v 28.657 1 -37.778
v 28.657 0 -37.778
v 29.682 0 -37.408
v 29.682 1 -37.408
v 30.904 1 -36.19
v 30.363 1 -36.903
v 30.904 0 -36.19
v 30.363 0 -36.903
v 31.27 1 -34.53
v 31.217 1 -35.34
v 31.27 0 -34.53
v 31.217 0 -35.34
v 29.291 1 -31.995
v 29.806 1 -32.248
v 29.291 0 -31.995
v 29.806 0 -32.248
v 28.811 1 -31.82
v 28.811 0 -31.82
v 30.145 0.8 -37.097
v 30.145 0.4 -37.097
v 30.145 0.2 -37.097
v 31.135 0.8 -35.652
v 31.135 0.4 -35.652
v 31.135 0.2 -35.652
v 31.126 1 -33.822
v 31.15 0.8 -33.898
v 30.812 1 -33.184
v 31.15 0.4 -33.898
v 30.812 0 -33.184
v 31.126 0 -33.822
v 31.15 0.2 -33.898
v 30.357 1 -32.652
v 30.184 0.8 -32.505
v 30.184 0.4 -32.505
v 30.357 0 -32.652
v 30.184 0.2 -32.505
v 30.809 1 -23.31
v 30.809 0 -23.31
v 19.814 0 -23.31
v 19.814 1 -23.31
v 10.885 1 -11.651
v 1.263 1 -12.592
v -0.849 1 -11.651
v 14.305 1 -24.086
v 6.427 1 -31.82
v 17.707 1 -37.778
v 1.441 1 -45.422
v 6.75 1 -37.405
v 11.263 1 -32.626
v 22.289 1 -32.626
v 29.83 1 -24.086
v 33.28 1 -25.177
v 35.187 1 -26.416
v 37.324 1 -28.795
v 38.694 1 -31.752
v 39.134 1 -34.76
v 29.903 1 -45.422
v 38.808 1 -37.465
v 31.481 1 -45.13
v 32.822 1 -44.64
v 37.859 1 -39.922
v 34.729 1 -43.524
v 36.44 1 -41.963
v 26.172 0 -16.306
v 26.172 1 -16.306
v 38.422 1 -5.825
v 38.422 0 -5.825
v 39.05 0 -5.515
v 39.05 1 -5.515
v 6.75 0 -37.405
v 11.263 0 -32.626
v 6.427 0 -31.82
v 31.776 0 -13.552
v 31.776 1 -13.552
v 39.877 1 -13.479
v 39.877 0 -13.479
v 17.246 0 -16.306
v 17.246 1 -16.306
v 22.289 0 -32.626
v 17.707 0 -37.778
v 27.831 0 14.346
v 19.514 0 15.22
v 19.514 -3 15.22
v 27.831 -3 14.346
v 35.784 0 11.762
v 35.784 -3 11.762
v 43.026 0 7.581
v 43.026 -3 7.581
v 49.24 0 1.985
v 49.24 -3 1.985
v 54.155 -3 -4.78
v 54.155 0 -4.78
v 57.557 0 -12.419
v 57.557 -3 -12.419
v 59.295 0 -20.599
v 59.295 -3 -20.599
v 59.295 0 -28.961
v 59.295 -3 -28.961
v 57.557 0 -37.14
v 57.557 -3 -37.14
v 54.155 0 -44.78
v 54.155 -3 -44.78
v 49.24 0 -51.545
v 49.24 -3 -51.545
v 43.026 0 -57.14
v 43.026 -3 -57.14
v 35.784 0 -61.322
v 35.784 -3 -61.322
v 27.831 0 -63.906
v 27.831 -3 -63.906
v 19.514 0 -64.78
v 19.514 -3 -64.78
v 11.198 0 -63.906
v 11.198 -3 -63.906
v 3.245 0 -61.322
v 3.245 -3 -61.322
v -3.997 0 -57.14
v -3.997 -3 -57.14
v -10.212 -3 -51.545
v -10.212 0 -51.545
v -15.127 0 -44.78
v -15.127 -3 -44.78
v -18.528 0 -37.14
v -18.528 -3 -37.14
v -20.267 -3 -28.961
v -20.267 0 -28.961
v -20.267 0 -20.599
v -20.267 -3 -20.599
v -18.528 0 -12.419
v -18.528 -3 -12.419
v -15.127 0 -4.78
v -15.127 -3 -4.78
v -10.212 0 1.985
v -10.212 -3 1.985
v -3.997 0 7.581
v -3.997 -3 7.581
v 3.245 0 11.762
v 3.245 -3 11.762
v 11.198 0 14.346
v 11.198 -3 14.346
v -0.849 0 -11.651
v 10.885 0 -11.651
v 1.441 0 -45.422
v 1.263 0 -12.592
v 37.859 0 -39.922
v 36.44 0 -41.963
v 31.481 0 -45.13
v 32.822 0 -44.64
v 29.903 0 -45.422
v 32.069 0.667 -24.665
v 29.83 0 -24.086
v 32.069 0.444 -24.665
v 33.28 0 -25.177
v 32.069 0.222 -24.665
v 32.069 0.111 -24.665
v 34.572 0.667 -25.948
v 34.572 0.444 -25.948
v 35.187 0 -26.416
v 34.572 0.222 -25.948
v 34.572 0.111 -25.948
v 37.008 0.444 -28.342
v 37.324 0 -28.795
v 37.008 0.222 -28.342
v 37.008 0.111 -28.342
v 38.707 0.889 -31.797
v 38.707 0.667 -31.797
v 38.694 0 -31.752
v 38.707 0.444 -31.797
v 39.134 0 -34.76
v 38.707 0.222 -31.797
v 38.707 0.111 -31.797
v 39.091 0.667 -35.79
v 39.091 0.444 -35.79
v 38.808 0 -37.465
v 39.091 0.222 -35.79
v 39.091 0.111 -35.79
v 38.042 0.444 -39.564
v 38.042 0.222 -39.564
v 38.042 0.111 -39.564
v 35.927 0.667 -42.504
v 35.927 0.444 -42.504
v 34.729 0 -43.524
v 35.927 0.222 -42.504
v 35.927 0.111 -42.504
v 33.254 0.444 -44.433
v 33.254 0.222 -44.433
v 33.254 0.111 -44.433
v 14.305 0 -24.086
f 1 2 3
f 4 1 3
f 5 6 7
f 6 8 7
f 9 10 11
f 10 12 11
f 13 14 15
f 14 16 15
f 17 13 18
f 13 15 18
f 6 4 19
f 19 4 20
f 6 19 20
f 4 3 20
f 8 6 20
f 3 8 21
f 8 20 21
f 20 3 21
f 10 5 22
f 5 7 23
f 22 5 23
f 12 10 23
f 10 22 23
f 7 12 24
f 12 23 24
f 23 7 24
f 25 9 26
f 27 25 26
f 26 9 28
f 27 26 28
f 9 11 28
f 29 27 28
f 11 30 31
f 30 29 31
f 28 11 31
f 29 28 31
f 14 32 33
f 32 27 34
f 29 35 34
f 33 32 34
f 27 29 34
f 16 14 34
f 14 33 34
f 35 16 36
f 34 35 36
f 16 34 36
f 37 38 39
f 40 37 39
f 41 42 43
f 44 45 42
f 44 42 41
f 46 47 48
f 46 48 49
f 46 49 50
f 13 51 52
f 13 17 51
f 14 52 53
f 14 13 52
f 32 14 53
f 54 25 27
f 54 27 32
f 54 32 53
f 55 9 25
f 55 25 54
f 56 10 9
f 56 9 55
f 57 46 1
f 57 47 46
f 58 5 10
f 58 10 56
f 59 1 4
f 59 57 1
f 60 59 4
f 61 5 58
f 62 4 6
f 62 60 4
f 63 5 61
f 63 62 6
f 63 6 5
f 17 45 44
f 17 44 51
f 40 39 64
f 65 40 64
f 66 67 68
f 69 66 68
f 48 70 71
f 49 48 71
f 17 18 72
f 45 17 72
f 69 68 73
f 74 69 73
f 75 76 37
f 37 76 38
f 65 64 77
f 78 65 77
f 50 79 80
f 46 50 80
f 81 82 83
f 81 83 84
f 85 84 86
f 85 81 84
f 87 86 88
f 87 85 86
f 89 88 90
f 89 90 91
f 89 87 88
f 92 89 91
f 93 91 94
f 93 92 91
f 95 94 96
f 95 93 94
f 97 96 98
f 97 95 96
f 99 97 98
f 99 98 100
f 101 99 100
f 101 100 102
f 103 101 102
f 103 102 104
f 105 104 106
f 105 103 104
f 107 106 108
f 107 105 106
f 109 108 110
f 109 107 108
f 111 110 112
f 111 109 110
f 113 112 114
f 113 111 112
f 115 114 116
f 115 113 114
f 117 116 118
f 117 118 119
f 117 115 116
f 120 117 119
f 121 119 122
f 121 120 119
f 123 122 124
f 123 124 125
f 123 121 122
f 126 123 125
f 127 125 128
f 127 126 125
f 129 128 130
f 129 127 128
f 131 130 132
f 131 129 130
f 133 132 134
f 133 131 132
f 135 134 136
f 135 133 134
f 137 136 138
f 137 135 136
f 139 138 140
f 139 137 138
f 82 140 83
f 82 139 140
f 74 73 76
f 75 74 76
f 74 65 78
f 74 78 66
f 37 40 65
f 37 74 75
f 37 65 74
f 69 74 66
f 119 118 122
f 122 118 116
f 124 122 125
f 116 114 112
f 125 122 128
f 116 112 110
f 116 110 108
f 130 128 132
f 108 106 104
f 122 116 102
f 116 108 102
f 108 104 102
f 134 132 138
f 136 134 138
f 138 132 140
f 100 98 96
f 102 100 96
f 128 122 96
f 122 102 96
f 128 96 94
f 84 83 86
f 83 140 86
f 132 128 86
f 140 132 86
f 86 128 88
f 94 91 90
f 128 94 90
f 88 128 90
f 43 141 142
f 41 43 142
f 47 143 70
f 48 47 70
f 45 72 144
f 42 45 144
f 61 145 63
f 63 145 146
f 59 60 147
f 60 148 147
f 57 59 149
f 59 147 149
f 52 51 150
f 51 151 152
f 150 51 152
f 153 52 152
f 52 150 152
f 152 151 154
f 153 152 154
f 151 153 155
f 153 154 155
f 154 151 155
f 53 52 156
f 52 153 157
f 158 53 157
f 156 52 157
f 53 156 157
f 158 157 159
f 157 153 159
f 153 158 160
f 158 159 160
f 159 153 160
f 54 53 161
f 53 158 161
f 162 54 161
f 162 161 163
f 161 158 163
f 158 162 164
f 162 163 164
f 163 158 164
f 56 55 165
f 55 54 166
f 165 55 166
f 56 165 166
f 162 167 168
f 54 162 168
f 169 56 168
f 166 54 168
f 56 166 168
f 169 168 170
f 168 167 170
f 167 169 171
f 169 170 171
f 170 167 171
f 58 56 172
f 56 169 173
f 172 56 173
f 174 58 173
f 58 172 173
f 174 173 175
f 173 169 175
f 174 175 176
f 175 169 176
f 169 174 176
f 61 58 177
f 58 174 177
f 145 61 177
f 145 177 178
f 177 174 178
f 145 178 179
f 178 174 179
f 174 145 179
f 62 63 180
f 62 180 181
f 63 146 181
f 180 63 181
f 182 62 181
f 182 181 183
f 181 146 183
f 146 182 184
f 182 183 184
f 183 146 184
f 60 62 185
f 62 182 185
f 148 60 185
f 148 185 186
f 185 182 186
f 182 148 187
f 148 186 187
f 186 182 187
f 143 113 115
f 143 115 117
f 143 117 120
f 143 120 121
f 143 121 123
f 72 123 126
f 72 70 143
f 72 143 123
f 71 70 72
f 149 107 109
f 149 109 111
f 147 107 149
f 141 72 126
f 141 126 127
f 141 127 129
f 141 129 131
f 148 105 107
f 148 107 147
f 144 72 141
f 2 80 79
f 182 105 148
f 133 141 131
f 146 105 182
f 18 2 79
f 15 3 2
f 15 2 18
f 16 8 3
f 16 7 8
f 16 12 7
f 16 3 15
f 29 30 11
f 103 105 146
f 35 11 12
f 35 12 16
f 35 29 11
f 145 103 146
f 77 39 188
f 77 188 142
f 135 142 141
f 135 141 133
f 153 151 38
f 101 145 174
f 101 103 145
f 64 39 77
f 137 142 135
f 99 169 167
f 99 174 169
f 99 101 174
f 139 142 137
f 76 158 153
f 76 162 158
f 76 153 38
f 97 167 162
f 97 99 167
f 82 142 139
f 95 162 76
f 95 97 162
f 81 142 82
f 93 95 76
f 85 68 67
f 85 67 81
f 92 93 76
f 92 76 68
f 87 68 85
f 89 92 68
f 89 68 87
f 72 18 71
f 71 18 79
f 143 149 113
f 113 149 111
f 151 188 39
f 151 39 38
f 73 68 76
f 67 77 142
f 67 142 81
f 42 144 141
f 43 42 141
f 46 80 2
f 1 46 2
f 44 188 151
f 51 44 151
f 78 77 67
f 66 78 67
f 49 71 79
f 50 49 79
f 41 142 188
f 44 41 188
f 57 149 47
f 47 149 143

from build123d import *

# Parameters (mm, degrees)
SKETCH_6_R      = 40
EXTRUDE_1_DEPTH = 3
EXTRUDE_2_DEPTH = 1


with BuildPart() as part:
    # 草图6 → 凸台-拉伸1 (new body)
    with BuildSketch(Plane(origin=(0, 0, 0), x_dir=(1, 0, 0), z_dir=(0, 1, 0))):
        with Locations(Location((19.514251299, 24.77976127, 0), (0, 0, 270))):
            Circle(SKETCH_6_R)
    extrude(amount=-EXTRUDE_1_DEPTH)

    # 草图5 → 凸台-拉伸2 (add)
    with BuildSketch(Plane(origin=(0, 0, 0), x_dir=(1, 0, 0), z_dir=(0, 1, 0))):
        with BuildLine():
            Line((-0.848561441, 11.65053417), (10.884604209, 11.65053417))
            Line((10.884604209, 11.65053417), (14.304935387, 24.086135056))
            Line((14.304935387, 24.086135056), (29.829988347, 24.086135056))
            add(Edge.make_bspline(
                [(29.829988347, 24.086135056), (31.936484303, 24.4825638), (34.318672471, 25.163188991), (36.899310154, 26.291897866), (41.512516948, 30.702347463), (41.488102133, 36.127500115), (39.148657484, 41.930059677), (35.435285923, 42.747710664), (34.028305284, 45.040203592), (29.903175199, 45.422244415)],
                knots=[0, 0, 0, 0, 0, 0, 0, 0, 0, 0, 1, 1, 1, 1, 1, 1, 1, 1, 1, 1], degree=9))
            Line((29.903175199, 45.422244415), (1.440650879, 45.422244415))
            Line((1.440650879, 45.422244415), (6.750403312, 37.405182946))
            Line((6.750403312, 37.405182946), (11.26337671, 32.626274642))
            Line((11.26337671, 32.626274642), (22.289106818, 32.626274642))
            Line((22.289106818, 32.626274642), (17.706952403, 37.77757749))
            Line((17.706952403, 37.77757749), (28.656556673, 37.77757749))
            add(Edge.make_bspline(
                [(28.656556673, 37.77757749), (30.140944485, 37.467864792), (32.017287649, 36.447603196), (32.240103399, 33.011549778), (30.02639504, 32.225274016), (28.810885255, 31.820229302)],
                knots=[0, 0, 0, 0, 0, 0, 1, 1, 1, 1, 1, 1], degree=5))
            Line((28.810885255, 31.820229302), (6.42710467, 31.820229302))
            Line((6.42710467, 31.820229302), (1.262783116, 12.592072153))
            Line((1.262783116, 12.592072153), (-0.848561441, 11.65053417))
        make_face()
        Polygon((39.877064038, 13.479058766), (30.809384671, 23.309535699), (19.814492322, 23.309535699), (26.172284787, 16.30574677), (17.246103581, 16.30574677), (38.422169227, 5.825267085), (39.049534436, 5.514770865), (31.775865335, 13.552375437), align=None)
    extrude(amount=EXTRUDE_2_DEPTH)


solid = part.part
